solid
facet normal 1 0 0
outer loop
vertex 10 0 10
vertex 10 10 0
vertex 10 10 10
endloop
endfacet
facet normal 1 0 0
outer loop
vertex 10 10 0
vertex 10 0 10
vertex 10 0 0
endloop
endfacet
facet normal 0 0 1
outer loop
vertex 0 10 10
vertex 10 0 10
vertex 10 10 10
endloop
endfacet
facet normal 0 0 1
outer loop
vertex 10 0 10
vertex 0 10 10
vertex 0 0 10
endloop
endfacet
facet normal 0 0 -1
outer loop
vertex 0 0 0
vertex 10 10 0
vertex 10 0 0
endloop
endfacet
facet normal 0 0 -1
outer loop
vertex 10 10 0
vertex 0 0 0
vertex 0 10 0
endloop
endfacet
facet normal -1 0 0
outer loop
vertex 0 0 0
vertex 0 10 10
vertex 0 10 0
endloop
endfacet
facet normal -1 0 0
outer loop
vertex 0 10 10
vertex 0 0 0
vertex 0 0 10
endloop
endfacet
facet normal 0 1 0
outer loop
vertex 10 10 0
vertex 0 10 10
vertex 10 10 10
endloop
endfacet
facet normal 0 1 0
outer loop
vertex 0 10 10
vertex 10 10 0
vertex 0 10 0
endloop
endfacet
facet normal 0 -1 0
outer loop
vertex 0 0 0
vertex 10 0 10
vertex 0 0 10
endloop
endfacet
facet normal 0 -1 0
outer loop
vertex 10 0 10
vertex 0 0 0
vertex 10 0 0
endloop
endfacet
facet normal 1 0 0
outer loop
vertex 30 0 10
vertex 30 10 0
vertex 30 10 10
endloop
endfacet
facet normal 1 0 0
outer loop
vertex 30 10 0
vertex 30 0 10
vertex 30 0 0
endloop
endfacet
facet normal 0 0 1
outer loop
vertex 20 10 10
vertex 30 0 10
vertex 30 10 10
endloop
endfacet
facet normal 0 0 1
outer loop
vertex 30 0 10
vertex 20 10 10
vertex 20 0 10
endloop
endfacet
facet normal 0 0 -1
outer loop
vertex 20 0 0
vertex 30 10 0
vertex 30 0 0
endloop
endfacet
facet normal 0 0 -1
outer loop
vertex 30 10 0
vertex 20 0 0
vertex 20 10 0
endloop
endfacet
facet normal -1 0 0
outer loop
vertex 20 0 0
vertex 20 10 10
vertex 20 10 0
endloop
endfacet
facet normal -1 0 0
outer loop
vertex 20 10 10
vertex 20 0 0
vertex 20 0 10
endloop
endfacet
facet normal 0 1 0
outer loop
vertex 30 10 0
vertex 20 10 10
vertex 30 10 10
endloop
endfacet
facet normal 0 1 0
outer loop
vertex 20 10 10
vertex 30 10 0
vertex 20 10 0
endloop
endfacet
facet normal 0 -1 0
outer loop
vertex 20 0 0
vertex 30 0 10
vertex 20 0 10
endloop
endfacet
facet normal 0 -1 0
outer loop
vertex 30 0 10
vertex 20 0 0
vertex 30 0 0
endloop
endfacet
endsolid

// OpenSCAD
// Seeded fault for tools/scad2step.py (TV-015): two disjoint blocks in one union, so the single
// top-level result is a compound of two solids, not one solid (check C3).
union() {
    cube([10, 10, 10]);
    translate([20, 0, 0]) cube([10, 10, 10]);
}
